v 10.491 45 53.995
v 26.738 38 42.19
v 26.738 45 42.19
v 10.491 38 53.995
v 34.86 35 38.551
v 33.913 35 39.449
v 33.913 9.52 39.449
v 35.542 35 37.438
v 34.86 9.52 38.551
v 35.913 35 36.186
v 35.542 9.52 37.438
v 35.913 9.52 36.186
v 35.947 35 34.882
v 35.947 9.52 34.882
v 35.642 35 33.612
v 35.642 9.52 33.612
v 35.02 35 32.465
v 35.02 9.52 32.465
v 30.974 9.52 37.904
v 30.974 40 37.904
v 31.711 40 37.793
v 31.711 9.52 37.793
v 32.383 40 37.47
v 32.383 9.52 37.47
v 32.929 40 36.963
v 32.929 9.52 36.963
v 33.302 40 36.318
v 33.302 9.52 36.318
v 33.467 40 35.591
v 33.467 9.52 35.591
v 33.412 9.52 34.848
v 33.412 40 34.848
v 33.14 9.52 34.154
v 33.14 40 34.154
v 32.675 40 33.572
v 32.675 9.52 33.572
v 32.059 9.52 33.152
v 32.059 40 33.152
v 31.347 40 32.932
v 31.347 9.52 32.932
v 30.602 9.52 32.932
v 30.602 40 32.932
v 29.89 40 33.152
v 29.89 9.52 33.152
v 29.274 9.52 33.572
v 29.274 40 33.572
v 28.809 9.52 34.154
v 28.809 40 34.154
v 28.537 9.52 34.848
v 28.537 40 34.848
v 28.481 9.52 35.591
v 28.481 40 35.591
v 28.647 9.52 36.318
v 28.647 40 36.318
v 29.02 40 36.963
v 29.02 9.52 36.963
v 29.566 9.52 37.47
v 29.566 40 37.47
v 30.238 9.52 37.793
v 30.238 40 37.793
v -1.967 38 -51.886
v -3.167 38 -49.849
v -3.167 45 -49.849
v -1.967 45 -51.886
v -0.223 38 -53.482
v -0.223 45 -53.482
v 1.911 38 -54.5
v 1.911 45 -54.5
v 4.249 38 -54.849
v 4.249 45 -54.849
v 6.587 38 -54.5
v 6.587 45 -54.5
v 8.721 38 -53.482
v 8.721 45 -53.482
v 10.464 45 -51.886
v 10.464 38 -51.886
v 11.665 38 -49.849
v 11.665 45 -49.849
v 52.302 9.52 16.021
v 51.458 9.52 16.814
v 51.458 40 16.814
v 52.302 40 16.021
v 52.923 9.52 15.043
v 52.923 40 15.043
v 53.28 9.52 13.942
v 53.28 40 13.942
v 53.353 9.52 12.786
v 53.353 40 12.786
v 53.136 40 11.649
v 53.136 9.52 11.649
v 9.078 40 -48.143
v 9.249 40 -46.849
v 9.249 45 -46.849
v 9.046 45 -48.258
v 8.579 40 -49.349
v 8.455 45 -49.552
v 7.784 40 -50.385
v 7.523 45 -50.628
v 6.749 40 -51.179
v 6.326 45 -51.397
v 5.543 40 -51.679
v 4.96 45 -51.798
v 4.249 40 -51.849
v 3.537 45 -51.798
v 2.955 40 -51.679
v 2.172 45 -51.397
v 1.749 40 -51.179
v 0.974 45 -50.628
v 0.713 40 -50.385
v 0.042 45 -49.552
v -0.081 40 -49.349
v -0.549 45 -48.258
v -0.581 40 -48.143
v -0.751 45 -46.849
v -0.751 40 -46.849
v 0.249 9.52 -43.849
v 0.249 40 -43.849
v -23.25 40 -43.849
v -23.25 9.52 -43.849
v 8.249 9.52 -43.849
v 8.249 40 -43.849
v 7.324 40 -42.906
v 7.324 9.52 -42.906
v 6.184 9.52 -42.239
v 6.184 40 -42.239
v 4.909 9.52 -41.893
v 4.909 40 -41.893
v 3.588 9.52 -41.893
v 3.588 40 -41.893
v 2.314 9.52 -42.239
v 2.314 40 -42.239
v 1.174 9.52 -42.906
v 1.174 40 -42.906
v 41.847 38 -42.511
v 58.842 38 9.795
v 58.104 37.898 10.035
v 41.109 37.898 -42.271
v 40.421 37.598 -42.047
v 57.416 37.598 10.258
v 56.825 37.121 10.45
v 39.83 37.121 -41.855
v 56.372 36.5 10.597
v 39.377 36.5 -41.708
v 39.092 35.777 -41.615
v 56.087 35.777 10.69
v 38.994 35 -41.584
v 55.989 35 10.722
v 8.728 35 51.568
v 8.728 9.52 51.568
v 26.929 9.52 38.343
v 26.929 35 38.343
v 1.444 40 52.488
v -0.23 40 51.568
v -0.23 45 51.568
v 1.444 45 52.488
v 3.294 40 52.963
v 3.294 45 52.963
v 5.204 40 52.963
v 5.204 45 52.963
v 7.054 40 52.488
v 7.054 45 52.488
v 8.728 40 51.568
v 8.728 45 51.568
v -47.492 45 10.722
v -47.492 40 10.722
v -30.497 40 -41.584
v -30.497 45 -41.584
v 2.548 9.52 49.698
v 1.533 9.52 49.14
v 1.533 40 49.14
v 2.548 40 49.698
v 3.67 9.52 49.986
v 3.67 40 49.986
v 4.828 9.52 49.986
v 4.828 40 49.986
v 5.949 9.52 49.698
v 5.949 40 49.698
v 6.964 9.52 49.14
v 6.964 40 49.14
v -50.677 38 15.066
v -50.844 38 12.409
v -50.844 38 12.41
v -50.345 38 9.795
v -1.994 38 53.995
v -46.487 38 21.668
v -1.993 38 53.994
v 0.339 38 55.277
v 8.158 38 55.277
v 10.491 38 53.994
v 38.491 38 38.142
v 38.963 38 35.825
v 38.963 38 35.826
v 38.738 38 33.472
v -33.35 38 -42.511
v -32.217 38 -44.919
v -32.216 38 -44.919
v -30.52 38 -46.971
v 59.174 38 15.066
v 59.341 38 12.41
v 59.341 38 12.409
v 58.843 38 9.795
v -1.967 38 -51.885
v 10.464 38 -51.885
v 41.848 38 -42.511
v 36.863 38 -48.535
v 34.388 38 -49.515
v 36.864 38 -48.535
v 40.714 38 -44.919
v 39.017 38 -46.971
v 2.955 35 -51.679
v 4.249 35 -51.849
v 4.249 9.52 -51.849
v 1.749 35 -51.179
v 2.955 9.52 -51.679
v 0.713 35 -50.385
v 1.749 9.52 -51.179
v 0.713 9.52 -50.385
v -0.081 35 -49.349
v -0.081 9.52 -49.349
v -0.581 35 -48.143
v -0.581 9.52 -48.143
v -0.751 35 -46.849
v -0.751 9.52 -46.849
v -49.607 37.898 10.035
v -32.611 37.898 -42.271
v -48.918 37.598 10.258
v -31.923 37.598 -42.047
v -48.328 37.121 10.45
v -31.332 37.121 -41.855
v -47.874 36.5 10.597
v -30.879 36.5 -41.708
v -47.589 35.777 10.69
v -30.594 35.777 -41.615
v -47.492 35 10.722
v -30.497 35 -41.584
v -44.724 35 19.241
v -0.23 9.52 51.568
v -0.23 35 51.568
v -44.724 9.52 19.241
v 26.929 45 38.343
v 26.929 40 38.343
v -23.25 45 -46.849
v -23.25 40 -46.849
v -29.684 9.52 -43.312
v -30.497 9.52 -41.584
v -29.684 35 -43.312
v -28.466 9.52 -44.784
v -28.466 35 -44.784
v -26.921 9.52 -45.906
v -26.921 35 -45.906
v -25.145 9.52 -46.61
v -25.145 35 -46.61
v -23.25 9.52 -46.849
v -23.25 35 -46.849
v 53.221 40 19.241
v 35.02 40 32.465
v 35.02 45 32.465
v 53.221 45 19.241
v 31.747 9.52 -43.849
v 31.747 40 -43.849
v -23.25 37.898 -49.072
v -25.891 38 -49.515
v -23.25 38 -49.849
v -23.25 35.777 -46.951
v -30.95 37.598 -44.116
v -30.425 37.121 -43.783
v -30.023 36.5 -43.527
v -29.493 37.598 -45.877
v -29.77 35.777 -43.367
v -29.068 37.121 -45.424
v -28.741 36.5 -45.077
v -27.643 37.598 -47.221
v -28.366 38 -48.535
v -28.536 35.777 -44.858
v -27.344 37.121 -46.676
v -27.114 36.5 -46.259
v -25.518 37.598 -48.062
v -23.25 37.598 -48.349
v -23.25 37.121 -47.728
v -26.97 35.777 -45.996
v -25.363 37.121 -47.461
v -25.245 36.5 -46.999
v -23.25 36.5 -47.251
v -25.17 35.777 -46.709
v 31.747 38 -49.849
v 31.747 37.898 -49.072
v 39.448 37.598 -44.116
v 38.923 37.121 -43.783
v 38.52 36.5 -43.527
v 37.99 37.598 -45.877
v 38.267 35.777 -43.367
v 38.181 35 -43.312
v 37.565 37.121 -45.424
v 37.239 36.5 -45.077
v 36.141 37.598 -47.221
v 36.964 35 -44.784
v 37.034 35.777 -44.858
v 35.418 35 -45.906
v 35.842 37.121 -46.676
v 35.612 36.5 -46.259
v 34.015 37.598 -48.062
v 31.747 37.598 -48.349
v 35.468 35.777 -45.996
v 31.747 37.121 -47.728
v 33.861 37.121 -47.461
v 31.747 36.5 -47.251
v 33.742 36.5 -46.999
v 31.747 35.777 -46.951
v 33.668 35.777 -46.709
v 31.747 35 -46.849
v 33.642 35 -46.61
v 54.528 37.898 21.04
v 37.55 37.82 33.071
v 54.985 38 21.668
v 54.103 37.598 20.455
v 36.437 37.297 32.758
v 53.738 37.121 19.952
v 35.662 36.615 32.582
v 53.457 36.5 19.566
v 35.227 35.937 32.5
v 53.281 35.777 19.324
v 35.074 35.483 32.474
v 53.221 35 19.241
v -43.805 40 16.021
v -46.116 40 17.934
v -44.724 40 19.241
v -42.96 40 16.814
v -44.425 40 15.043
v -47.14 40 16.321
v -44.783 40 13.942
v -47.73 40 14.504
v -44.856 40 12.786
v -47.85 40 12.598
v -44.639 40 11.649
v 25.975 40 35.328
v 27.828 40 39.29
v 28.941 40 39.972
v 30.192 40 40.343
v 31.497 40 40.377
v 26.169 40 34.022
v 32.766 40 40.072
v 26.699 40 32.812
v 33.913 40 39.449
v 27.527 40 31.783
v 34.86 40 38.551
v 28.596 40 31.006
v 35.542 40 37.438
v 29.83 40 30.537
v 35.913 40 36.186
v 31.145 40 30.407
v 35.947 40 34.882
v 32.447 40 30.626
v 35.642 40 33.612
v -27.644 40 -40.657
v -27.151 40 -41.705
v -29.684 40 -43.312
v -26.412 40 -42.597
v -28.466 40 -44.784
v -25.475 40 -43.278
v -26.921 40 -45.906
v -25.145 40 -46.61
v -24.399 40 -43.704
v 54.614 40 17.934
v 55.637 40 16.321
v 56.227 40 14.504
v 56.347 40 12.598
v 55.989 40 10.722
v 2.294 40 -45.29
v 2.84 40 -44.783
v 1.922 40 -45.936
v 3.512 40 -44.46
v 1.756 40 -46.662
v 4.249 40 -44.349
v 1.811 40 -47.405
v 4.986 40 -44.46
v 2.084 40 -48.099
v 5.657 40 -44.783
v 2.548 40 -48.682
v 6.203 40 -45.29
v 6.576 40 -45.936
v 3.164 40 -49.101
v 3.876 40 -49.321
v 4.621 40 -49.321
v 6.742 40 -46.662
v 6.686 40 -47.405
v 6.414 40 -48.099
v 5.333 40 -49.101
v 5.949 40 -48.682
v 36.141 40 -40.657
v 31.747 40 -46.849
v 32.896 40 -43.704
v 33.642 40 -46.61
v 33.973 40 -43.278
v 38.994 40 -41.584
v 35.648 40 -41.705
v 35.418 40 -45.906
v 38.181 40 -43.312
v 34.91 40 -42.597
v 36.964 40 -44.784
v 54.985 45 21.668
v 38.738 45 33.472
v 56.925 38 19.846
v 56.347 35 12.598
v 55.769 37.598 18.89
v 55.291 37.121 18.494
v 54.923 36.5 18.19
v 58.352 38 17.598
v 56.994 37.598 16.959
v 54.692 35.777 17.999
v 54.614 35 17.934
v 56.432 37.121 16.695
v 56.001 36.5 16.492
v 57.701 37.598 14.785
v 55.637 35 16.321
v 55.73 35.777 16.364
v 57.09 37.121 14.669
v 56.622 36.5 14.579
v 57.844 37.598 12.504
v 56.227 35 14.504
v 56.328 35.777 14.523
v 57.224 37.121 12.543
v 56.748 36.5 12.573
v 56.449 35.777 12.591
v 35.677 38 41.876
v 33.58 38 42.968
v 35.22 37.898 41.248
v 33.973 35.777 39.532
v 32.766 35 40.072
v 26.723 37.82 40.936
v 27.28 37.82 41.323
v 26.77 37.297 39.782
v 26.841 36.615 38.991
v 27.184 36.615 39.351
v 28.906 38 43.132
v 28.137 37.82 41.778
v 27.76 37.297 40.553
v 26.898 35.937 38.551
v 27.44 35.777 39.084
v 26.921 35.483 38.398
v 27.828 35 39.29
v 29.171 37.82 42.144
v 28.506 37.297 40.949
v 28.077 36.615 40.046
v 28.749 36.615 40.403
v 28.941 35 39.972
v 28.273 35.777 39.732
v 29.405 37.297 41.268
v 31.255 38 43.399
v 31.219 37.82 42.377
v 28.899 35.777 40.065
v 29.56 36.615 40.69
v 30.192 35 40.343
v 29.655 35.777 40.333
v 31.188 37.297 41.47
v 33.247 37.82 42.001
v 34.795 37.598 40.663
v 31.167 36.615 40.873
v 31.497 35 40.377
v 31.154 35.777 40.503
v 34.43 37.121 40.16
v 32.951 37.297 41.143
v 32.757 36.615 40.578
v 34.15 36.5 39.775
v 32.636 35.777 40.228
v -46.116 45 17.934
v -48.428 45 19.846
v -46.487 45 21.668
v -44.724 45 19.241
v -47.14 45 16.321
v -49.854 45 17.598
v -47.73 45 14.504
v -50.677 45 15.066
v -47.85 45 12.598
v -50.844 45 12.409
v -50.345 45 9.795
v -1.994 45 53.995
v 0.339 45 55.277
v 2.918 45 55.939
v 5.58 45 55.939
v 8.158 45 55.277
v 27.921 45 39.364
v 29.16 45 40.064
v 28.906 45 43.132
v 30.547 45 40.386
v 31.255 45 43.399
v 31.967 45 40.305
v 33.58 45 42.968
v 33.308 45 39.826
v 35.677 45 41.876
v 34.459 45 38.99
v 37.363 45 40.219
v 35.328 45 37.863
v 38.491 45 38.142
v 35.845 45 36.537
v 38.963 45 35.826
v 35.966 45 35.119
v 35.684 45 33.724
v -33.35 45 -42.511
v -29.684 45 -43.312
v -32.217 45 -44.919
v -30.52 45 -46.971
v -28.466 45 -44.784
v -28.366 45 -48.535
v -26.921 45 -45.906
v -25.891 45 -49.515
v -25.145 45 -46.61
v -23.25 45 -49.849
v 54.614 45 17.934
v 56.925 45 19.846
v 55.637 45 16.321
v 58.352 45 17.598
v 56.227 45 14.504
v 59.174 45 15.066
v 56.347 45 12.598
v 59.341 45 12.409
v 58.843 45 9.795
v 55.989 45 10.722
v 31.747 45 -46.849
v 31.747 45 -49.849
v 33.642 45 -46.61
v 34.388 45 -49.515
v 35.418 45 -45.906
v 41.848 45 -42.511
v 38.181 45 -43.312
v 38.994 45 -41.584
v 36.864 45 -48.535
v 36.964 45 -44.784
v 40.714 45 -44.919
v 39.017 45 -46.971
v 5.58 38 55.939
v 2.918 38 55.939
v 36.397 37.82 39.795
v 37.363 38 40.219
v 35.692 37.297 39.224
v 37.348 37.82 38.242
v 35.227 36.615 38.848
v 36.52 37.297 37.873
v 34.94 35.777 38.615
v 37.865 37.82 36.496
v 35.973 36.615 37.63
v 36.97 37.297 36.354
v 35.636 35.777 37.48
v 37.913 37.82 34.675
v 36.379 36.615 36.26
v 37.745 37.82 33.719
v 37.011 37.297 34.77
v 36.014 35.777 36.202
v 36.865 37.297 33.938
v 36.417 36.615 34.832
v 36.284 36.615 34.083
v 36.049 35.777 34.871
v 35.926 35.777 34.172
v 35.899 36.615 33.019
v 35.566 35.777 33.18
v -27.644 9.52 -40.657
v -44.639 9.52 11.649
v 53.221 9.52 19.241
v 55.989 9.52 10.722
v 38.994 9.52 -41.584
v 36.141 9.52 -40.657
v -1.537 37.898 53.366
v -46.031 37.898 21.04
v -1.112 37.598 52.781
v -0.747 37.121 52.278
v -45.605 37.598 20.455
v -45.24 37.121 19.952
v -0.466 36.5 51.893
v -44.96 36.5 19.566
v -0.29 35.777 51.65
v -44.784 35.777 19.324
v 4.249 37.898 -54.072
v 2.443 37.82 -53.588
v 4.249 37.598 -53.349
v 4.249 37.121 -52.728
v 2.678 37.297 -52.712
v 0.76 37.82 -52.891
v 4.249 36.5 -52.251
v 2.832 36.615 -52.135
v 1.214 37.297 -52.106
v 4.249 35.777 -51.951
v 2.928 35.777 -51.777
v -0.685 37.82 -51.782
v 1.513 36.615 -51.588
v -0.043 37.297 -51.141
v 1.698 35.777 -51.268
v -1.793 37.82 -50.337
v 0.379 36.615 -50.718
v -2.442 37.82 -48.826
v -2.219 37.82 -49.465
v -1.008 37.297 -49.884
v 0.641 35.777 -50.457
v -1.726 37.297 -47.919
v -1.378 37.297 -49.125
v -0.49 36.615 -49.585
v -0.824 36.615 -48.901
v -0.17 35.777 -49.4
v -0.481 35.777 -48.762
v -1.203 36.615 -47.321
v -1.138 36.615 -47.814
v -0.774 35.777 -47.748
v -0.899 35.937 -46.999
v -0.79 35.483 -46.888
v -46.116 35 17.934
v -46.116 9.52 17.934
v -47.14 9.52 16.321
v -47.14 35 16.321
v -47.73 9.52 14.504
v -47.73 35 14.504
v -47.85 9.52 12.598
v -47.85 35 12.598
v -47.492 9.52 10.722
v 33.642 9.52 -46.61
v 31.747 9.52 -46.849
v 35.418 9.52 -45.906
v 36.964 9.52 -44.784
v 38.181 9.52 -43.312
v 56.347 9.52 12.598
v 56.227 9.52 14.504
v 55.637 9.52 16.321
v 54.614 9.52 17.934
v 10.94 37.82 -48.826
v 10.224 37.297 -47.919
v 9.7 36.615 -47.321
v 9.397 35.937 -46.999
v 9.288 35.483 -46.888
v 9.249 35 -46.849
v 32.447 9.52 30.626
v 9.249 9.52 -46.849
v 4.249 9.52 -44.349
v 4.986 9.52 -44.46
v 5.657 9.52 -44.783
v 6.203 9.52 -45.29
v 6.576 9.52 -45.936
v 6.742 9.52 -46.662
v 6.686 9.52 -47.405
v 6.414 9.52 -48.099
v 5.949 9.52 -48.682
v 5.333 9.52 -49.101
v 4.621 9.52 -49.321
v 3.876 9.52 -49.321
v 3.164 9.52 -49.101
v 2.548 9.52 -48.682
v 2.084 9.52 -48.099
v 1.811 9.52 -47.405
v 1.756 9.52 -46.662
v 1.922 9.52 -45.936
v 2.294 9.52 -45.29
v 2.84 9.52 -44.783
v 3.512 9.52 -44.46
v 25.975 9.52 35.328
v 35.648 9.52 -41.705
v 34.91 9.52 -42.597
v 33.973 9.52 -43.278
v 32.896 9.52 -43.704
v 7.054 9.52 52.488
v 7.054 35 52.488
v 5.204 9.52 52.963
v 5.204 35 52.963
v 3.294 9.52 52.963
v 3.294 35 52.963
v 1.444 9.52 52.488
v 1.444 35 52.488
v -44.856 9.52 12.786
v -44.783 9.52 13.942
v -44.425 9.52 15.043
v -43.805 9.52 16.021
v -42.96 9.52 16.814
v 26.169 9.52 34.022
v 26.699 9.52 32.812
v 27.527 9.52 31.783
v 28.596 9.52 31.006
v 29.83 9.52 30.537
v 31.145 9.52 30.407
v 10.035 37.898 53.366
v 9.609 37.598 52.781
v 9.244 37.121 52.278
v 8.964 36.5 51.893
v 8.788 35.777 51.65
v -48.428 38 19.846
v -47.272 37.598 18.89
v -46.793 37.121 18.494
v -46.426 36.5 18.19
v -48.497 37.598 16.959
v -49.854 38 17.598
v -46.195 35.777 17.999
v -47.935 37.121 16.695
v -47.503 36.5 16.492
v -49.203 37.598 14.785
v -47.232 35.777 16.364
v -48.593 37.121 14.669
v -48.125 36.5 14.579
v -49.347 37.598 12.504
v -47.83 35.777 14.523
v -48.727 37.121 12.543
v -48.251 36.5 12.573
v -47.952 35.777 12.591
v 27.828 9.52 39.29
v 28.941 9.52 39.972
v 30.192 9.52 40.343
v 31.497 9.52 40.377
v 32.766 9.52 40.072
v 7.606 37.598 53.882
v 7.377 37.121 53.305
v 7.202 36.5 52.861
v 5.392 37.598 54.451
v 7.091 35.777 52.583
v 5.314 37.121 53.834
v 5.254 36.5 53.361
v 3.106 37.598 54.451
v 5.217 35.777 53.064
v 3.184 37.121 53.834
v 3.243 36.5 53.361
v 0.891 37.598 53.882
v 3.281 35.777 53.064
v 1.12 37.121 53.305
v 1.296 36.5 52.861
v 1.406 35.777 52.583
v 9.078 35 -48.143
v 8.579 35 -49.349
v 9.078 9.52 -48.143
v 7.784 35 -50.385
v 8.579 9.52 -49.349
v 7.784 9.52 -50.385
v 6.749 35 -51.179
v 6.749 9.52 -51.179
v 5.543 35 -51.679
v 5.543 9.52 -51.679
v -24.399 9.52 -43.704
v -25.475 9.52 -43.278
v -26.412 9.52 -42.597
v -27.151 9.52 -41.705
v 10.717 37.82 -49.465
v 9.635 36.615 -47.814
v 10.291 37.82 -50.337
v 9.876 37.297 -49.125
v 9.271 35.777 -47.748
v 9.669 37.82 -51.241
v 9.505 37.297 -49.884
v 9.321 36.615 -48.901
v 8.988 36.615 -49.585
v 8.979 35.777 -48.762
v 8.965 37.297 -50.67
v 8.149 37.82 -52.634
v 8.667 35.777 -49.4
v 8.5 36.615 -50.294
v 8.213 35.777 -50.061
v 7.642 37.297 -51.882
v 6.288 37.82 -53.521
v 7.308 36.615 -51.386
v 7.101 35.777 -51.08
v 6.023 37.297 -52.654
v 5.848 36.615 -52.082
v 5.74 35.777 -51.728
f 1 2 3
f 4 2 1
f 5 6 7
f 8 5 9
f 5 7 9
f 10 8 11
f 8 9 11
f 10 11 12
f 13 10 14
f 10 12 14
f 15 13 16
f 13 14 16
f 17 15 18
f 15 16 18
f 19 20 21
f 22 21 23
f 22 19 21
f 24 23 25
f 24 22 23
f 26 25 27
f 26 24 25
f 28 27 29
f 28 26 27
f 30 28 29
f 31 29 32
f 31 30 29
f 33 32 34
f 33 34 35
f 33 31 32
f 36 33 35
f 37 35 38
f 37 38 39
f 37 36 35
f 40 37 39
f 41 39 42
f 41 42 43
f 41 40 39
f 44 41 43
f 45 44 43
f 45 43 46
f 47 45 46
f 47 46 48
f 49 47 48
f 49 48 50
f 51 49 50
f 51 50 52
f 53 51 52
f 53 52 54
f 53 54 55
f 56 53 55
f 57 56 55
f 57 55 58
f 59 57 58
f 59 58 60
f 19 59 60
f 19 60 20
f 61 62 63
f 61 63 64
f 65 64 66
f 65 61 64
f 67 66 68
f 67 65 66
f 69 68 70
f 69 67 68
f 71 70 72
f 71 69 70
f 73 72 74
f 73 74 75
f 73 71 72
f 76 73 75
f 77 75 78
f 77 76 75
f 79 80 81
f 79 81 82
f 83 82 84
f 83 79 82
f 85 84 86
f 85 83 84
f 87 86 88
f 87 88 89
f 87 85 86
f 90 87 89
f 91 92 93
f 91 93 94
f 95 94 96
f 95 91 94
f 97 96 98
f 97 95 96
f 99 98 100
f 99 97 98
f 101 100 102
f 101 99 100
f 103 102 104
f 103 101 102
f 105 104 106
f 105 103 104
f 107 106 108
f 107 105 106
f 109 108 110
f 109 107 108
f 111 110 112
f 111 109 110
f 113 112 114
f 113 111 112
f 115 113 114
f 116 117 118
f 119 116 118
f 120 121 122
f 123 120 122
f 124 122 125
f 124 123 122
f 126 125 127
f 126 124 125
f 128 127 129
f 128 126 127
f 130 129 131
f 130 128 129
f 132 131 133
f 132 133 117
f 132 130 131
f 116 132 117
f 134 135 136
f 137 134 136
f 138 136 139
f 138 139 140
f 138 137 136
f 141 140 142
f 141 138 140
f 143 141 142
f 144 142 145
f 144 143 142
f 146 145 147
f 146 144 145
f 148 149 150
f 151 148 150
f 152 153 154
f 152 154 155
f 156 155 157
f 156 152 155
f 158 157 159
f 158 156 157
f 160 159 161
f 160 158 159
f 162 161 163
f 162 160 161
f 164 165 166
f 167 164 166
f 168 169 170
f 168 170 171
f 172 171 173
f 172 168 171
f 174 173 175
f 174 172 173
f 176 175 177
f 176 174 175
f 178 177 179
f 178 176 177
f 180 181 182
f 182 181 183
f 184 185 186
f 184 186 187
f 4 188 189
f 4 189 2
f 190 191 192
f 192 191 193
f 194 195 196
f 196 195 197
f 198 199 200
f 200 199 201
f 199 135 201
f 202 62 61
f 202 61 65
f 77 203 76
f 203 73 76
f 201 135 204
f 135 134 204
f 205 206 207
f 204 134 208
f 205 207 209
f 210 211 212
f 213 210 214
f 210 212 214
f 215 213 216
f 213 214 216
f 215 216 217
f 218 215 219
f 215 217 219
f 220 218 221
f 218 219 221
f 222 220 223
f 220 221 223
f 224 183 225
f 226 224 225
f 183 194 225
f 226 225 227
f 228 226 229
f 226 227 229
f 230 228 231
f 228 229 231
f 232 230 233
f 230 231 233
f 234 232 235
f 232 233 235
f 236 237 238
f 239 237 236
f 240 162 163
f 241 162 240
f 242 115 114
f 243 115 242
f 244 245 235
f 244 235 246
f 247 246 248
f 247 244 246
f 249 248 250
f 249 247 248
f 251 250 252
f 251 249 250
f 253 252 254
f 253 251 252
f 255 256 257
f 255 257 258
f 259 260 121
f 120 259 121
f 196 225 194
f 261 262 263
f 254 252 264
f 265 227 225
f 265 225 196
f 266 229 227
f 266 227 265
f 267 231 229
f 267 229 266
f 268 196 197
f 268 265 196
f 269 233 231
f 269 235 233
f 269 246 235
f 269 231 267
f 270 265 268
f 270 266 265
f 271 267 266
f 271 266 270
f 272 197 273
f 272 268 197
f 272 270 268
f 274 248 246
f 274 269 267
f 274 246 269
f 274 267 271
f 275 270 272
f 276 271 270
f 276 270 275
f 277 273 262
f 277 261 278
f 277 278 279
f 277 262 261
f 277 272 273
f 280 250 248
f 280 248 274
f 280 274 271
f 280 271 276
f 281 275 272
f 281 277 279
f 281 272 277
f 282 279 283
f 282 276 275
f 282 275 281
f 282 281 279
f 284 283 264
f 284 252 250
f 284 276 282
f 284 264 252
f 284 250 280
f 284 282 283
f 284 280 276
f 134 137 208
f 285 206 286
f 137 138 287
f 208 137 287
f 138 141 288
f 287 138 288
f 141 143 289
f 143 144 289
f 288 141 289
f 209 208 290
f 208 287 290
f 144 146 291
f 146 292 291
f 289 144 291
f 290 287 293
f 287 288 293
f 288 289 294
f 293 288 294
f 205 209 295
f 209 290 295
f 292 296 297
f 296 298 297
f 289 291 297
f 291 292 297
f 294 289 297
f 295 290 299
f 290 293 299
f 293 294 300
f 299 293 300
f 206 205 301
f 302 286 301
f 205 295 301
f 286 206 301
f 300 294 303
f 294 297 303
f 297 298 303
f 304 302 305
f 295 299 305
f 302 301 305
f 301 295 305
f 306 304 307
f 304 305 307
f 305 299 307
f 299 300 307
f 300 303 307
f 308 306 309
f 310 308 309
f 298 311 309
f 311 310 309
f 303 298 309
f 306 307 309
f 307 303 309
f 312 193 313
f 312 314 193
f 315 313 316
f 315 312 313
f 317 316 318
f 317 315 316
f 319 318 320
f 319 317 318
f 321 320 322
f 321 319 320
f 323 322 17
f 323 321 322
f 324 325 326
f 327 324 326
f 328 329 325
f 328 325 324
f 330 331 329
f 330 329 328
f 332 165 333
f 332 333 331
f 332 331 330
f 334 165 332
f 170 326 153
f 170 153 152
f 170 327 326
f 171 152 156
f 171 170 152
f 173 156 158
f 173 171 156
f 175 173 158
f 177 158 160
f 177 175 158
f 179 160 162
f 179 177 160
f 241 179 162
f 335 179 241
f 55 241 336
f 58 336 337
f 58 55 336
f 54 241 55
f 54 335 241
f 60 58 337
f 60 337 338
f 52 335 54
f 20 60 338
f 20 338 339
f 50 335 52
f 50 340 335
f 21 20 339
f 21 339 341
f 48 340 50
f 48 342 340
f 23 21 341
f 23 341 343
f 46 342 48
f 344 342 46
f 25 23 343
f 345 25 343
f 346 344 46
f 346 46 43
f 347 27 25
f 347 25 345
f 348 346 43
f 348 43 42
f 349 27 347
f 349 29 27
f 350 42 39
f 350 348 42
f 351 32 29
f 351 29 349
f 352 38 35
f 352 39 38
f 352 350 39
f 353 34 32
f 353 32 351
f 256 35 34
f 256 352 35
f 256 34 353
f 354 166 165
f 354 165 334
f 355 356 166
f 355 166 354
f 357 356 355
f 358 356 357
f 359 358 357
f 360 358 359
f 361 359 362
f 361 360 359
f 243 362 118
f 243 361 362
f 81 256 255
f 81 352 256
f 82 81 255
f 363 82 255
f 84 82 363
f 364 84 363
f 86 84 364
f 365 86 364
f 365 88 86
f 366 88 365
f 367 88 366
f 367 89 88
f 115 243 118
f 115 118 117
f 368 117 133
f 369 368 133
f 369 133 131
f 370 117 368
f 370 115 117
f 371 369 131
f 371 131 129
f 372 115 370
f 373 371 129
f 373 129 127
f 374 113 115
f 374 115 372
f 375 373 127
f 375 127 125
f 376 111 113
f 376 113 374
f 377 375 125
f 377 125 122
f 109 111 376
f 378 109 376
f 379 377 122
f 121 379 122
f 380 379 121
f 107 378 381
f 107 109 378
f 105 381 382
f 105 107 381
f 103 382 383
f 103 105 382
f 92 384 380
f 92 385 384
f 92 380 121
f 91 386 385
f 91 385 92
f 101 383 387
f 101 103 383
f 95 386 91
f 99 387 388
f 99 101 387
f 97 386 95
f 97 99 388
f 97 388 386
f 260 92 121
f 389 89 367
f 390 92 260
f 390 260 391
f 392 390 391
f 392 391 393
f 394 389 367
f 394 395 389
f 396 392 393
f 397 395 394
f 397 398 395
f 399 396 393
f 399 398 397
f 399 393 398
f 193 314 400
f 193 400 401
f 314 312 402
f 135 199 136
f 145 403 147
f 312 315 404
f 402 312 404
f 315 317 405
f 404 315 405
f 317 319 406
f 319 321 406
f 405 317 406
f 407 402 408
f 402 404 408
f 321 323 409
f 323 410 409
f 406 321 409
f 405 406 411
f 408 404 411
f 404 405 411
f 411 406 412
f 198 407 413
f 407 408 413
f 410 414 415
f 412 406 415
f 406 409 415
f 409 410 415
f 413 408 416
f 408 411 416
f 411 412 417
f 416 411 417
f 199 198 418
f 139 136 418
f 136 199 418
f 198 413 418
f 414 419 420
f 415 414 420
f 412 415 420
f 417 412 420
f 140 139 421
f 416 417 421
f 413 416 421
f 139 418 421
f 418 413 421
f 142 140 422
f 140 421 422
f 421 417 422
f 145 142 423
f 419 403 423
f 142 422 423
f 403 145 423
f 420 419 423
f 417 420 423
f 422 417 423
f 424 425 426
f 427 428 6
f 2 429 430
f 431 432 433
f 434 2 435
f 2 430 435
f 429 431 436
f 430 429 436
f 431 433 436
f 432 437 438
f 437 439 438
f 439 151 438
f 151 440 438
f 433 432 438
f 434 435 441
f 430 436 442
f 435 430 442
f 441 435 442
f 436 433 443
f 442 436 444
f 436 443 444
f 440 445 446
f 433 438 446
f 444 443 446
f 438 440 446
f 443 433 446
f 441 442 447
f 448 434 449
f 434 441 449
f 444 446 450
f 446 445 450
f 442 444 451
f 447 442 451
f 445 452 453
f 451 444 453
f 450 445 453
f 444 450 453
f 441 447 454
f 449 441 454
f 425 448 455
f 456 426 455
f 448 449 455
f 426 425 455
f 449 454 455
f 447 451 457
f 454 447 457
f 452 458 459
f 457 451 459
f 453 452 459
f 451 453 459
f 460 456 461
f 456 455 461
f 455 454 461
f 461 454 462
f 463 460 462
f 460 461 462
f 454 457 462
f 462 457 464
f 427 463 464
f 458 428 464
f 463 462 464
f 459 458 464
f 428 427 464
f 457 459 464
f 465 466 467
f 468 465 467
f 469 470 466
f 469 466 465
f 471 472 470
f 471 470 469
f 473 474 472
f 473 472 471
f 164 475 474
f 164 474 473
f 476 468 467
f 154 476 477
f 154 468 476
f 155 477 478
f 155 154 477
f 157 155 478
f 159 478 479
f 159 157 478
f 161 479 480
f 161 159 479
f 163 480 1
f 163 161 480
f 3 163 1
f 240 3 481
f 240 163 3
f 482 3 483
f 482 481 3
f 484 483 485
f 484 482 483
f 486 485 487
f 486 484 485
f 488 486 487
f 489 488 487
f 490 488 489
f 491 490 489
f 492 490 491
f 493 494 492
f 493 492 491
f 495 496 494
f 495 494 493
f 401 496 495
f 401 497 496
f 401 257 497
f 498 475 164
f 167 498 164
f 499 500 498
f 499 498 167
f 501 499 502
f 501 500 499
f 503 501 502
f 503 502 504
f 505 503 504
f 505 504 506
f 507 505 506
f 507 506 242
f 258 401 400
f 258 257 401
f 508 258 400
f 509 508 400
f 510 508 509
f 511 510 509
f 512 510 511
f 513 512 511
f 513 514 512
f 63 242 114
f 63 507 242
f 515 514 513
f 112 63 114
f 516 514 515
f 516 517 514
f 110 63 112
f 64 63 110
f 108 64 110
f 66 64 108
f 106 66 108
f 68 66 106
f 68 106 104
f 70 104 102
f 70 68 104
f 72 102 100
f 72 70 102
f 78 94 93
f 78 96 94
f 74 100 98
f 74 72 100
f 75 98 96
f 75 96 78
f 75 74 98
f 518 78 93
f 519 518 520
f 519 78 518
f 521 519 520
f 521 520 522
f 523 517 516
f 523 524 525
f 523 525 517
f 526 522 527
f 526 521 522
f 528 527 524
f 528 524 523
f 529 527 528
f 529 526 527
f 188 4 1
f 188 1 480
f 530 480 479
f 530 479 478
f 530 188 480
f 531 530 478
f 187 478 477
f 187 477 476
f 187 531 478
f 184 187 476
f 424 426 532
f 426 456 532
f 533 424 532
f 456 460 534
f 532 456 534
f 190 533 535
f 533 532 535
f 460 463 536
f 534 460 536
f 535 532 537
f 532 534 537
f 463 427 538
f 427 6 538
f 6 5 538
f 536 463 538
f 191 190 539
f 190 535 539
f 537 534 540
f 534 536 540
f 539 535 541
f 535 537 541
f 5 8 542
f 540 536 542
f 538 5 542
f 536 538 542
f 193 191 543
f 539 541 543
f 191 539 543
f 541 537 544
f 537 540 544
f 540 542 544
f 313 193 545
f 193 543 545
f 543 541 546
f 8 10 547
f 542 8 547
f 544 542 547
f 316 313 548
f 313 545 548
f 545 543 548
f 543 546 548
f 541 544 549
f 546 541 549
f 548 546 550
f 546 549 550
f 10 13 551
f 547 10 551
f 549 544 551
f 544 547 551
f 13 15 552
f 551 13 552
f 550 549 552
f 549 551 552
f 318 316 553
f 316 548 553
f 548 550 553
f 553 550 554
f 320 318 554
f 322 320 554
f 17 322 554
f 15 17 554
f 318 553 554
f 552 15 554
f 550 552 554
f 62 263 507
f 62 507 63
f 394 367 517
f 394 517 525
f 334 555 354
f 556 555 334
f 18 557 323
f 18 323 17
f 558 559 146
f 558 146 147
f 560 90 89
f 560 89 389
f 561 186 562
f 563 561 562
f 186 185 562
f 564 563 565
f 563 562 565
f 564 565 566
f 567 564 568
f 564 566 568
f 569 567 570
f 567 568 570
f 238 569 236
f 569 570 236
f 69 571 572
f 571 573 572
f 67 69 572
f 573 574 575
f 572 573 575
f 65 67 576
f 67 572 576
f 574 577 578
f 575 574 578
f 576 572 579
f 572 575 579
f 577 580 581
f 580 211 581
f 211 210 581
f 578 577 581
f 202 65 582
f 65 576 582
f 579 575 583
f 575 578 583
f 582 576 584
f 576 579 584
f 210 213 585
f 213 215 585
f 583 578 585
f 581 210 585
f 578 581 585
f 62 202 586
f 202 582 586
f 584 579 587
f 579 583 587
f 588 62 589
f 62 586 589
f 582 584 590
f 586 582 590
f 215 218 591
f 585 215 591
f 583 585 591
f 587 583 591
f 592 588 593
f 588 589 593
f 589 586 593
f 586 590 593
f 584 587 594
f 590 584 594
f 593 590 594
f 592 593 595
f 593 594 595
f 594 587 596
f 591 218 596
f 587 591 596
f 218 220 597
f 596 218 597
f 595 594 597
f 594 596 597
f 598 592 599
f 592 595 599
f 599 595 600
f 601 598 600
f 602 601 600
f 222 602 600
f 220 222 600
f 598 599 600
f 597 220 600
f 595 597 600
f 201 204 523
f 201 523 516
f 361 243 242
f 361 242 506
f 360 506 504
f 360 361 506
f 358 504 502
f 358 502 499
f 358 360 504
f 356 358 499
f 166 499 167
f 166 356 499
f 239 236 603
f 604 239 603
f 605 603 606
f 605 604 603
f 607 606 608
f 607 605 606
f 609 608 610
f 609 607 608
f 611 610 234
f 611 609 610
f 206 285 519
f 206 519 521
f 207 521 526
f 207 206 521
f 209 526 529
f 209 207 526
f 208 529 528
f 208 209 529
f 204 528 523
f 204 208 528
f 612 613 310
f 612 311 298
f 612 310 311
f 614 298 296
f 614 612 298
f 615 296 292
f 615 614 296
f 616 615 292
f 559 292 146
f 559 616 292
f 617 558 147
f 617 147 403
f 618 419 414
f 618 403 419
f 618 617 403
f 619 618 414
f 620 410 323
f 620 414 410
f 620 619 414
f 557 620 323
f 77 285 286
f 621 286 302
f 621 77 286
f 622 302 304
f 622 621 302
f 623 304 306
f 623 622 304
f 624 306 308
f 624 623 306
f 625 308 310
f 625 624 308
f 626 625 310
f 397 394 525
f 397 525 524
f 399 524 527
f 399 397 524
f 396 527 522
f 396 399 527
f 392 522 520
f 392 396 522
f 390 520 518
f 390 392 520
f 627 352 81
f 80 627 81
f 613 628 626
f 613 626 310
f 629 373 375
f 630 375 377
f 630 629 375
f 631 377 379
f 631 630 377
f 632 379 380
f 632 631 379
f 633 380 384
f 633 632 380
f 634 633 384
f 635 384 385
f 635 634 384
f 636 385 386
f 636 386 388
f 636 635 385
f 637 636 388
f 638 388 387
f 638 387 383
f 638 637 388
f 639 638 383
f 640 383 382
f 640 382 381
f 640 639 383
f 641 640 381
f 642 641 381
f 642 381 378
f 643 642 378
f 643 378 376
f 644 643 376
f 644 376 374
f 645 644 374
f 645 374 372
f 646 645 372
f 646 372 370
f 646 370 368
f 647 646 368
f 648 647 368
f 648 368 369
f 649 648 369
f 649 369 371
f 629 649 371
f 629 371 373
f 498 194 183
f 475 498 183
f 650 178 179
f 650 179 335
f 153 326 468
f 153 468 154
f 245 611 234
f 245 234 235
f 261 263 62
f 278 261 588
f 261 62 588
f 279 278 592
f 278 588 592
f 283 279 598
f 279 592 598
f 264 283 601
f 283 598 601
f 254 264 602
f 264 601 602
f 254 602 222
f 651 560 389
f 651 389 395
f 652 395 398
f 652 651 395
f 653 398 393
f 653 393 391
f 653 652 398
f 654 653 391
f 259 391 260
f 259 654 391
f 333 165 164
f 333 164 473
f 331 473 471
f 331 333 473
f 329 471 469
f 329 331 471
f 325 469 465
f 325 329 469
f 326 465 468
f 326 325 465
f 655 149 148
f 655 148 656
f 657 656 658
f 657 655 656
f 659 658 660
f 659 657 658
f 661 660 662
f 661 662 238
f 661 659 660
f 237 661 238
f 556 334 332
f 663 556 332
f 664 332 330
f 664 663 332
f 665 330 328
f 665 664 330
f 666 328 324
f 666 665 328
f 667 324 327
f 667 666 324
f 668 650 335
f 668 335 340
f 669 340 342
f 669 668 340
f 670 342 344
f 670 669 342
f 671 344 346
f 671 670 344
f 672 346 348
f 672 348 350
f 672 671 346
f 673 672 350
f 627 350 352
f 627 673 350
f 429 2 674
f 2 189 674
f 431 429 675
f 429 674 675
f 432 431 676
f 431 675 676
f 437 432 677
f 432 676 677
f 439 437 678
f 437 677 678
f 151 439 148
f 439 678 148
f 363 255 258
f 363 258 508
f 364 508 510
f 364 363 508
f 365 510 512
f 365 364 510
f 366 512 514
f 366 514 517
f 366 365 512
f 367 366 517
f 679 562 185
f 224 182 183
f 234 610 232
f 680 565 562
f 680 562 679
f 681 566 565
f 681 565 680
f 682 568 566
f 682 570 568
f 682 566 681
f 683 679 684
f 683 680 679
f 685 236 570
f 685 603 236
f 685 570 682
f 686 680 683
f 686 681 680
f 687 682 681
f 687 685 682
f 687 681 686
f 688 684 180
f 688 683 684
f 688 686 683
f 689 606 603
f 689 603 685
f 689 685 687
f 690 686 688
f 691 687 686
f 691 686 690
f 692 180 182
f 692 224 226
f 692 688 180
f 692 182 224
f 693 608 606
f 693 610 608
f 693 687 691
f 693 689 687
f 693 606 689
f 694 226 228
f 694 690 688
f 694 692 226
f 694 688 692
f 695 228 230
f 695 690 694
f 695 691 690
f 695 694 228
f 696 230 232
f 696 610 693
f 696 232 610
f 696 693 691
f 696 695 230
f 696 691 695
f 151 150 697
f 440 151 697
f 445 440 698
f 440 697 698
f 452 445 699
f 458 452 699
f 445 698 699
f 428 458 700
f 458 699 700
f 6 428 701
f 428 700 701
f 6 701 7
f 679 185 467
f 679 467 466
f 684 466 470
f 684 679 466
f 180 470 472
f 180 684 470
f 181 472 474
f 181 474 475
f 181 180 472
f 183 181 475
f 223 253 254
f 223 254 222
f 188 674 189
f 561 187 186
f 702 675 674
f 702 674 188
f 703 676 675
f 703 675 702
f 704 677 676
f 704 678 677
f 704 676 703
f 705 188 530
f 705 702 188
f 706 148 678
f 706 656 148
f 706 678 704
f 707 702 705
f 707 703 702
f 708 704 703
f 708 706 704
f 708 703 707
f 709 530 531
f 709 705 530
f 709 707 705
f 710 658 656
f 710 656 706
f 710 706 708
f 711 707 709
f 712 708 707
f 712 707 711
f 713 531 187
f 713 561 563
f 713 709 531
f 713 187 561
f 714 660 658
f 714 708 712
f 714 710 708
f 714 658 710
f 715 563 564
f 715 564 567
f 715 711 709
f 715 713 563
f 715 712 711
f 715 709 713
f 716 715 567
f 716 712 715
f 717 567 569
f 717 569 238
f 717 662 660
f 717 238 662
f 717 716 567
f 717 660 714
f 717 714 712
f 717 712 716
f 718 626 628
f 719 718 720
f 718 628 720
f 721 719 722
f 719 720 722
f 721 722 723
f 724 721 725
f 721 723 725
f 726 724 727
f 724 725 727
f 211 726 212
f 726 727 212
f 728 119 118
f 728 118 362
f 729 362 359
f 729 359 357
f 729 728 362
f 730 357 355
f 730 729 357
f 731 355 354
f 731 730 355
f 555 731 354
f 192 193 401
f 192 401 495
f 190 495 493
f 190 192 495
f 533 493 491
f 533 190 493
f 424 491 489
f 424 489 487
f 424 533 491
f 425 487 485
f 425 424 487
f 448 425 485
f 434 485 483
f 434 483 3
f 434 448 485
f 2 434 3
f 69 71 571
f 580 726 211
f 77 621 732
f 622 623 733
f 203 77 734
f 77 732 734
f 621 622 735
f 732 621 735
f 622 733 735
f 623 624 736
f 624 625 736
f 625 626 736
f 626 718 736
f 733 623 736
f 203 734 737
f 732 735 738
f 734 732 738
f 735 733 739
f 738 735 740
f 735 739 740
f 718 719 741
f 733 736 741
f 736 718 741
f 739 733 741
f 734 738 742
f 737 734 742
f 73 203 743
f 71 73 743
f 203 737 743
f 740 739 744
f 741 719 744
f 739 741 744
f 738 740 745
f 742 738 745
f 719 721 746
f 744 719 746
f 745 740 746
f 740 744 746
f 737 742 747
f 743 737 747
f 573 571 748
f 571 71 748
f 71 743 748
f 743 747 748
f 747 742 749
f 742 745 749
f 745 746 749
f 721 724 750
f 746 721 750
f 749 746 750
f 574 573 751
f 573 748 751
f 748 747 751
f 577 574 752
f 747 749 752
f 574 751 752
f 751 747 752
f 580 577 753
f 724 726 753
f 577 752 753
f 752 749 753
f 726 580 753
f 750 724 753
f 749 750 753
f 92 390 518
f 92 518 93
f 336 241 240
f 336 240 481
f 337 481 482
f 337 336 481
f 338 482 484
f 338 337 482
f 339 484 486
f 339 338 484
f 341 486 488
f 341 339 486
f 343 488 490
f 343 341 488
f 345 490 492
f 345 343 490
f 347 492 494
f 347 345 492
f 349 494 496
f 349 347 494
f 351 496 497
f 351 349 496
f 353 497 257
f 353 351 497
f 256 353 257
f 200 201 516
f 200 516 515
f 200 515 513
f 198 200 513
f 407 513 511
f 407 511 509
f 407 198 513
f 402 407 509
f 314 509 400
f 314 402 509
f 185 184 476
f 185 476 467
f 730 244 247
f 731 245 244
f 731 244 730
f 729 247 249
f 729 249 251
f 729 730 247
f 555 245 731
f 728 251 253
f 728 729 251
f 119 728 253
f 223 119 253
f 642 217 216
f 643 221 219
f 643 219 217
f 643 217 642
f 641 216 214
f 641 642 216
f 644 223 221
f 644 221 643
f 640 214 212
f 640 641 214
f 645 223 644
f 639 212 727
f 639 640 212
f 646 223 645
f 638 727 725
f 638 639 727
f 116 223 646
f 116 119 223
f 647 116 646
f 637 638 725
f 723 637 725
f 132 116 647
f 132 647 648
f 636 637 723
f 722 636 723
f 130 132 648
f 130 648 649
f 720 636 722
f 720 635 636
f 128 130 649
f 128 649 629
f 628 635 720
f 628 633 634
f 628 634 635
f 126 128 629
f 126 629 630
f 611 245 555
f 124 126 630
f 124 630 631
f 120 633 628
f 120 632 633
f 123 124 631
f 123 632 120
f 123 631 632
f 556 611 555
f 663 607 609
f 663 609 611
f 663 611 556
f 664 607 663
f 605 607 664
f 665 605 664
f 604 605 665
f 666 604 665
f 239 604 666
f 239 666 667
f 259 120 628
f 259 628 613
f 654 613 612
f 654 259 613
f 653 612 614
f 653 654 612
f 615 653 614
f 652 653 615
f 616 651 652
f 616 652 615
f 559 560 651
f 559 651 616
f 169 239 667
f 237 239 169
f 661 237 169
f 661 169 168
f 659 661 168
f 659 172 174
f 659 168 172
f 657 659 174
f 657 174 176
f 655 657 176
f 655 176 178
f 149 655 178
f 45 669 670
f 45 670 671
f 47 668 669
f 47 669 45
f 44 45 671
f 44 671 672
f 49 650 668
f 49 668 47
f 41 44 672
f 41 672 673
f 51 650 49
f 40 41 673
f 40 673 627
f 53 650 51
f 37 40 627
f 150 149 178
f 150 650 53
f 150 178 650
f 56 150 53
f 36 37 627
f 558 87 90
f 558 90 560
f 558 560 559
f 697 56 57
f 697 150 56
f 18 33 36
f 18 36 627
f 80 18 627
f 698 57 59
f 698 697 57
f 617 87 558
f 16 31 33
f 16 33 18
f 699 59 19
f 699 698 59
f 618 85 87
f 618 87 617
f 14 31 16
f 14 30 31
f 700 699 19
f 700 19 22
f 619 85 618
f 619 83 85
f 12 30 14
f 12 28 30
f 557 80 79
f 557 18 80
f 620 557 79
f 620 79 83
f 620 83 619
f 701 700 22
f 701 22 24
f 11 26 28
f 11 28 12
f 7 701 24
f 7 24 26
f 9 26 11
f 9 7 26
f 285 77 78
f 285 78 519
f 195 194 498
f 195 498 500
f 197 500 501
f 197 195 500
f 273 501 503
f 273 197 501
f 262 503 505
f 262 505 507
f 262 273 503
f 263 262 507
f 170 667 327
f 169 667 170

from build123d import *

# Parameters (mm, degrees)
SKETCH1_R                = 2.5
BOSS_EXTRUDE1_DEPTH      = 40
BOSS_EXTRUDE2_DEPTH      = 5
BOSS_EXTRUDE2_DEPTH_BACK = 2
FILLET1_R                = 3
BOSS_EXTRUDE3_START      = 7
SKETCH3_R                = 2.5
BOSS_EXTRUDE3_DEPTH      = 7
SKETCH4_R                = 2.5
CUT_EXTRUDE1_DEPTH       = 16.52


with BuildPart() as part:
    # Sketch1 → Boss-Extrude1 (new body)
    # profile 1 of 3: a face of its own
    with BuildSketch(Plane(origin=(0, 0, 0), x_dir=(1, 0, 0), z_dir=(0, 1, 0))):
        with BuildLine():
            Line((55.989380272, -10.721623107), (38.994348201, 41.58370731))
            ThreePointArc((38.994348201, 41.58370731), (36.22622117, 45.39370731), (31.747297547, 46.848997812))
            Line((31.747297547, 46.848997812), (9.248758018, 46.848997812))
            ThreePointArc((9.248758018, 46.848997812), (7.784291924, 50.384531718), (4.248758018, 51.848997812))
            Line((4.248758018, 51.848997812), (4.248758018, 50.848997812))
            ThreePointArc((4.248758018, 50.848997812), (1.420330893, 49.677424937), (0.248758018, 46.848997812))
            Line((0.248758018, 46.848997812), (-23.249781512, 46.848997812))
            ThreePointArc((-23.249781512, 46.848997812), (-27.728705135, 45.39370731), (-30.496832166, 41.58370731))
            Line((-30.496832166, 41.58370731), (-47.491864237, -10.721623107))
            ThreePointArc((-47.491864237, -10.721623107), (-47.491864237, -15.431042101), (-44.723737205, -19.241042101))
            Line((-44.723737205, -19.241042101), (-0.230165605, -51.567514092))
            ThreePointArc((-0.230165605, -51.567514092), (4.248758018, -53.022804594), (8.72768164, -51.567514092))
            Line((8.72768164, -51.567514092), (27.738399463, -37.755419106))
            ThreePointArc((27.738399463, -37.755419106), (30.34872958, -39.355031459), (33.325608449, -38.640346074))
            Line((33.325608449, -38.640346074), (33.913393702, -39.449363068))
            ThreePointArc((33.913393702, -39.449363068), (35.912909143, -36.186450422), (35.019552412, -32.465351835))
            Line((35.019552412, -32.465351835), (53.22125324, -19.241042101))
            ThreePointArc((53.22125324, -19.241042101), (55.989380272, -15.431042101), (55.989380272, -10.721623107))
        make_face()
        with Locations(Location((4.248758018, 46.848997812, 0), (0, 0, 270))):
            Circle(SKETCH1_R, mode=Mode.SUBTRACT)
        with Locations(Location((30.97446744, -35.404278096, 0), (0, 0, 270))):
            Circle(SKETCH1_R, mode=Mode.SUBTRACT)
        with BuildLine():
            ThreePointArc((-23.249781512, 43.848997812), (-25.965349378, 42.966656326), (-27.643662617, 40.656656326))
            Line((-27.643662617, 40.656656326), (-44.638694688, -11.64867409))
            ThreePointArc((-44.638694688, -11.64867409), (-44.638694688, -14.503991118), (-42.960381448, -16.813991118))
            Line((-42.960381448, -16.813991118), (1.533190152, -49.140463108))
            ThreePointArc((1.533190152, -49.140463108), (4.248758018, -50.022804594), (6.964325883, -49.140463108))
            Line((6.964325883, -49.140463108), (25.975043706, -35.328368122))
            ThreePointArc((25.975043706, -35.328368122), (28.035541179, -31.359193125), (32.447179661, -30.626086104))
            Line((32.447179661, -30.626086104), (51.457897483, -16.813991118))
            ThreePointArc((51.457897483, -16.813991118), (53.136210723, -14.503991118), (53.136210723, -11.64867409))
            Line((53.136210723, -11.64867409), (36.141178653, 40.656656326))
            ThreePointArc((36.141178653, 40.656656326), (34.462865413, 42.966656326), (31.747297547, 43.848997812))
            Line((31.747297547, 43.848997812), (8.248758018, 43.848997812))
            ThreePointArc((8.248758018, 43.848997812), (4.248758018, 41.848997812), (0.248758018, 43.848997812))
            Line((0.248758018, 43.848997812), (-23.249781512, 43.848997812))
        make_face(mode=Mode.SUBTRACT)
    # profile 2 of 3: a face of its own
    with BuildSketch(Plane(origin=(0, 0, 0), x_dir=(1, 0, 0), z_dir=(0, 1, 0))):
        with BuildLine():
            ThreePointArc((26.929382468, -38.343204358), (30.192295115, -40.342719799), (33.913393702, -39.449363068))
            Line((33.913393702, -39.449363068), (33.325608449, -38.640346074))
            ThreePointArc((33.325608449, -38.640346074), (30.34872958, -39.355031459), (27.738399463, -37.755419106))
            Line((27.738399463, -37.755419106), (26.929382468, -38.343204358))
        make_face()
    # profile 3 of 3: a face of its own
    with BuildSketch(Plane(origin=(0, 0, 0), x_dir=(1, 0, 0), z_dir=(0, 1, 0))):
        with BuildLine():
            Line((4.248758018, 50.848997812), (4.248758018, 51.848997812))
            ThreePointArc((4.248758018, 51.848997812), (0.713224112, 50.384531718), (-0.751241982, 46.848997812))
            Line((-0.751241982, 46.848997812), (0.248758018, 46.848997812))
            ThreePointArc((0.248758018, 46.848997812), (1.420330893, 49.677424937), (4.248758018, 50.848997812))
        make_face()
    extrude(amount=BOSS_EXTRUDE1_DEPTH)

    # Sketch2 → Boss-Extrude2 (add, two sides: drawn at the far end of the back side and taken through both)
    with BuildSketch(Plane(origin=(0, 40, 0), x_dir=(1, 0, 0), z_dir=(0, 1, 0)).offset(-BOSS_EXTRUDE2_DEPTH_BACK)):
        Polygon((-30.496832166, 41.58370731), (-33.350001715, 42.510758293), (-50.345033785, -9.794572124), (-47.491864237, -10.721623107), align=None)
        with BuildLine():
            Line((-1.993521362, -53.994565075), (-46.487092962, -21.668093084))
            ThreePointArc((-46.487092962, -21.668093084), (-50.345033785, -16.358093084), (-50.345033785, -9.794572124))
            Line((-50.345033785, -9.794572124), (-47.491864237, -10.721623107))
            ThreePointArc((-47.491864237, -10.721623107), (-47.491864237, -15.431042101), (-44.723737205, -19.241042101))
            Line((-44.723737205, -19.241042101), (-0.230165605, -51.567514092))
            ThreePointArc((-0.230165605, -51.567514092), (4.248758018, -53.022804594), (8.72768164, -51.567514092))
            Line((8.72768164, -51.567514092), (26.929382468, -38.343204358))
            ThreePointArc((26.929382468, -38.343204358), (33.913393702, -39.449363068), (35.019552412, -32.465351835))
            Line((35.019552412, -32.465351835), (53.22125324, -19.241042101))
            ThreePointArc((53.22125324, -19.241042101), (55.989380272, -15.431042101), (55.989380272, -10.721623107))
            Line((55.989380272, -10.721623107), (38.994348201, 41.58370731))
            ThreePointArc((38.994348201, 41.58370731), (36.22622117, 45.39370731), (31.747297547, 46.848997812))
            Line((31.747297547, 46.848997812), (9.248758018, 46.848997812))
            ThreePointArc((9.248758018, 46.848997812), (4.248758018, 51.848997812), (-0.751241982, 46.848997812))
            Line((-0.751241982, 46.848997812), (-23.249781512, 46.848997812))
            Line((-23.249781512, 46.848997812), (-23.249781512, 49.848997812))
            Line((-23.249781512, 49.848997812), (-3.16744047, 49.848997812))
            ThreePointArc((-3.16744047, 49.848997812), (4.248758018, 54.848997812), (11.664956505, 49.848997812))
            Line((11.664956505, 49.848997812), (31.747297547, 49.848997812))
            ThreePointArc((31.747297547, 49.848997812), (37.989576927, 47.820758293), (41.84751775, 42.510758293))
            Line((41.84751775, 42.510758293), (58.842549821, -9.794572124))
            ThreePointArc((58.842549821, -9.794572124), (58.842549821, -16.358093084), (54.984608997, -21.668093084))
            Line((54.984608997, -21.668093084), (38.737653807, -33.472196981))
            ThreePointArc((38.737653807, -33.472196981), (35.676749458, -41.876414051), (26.737992587, -42.190461178))
            Line((26.737992587, -42.190461178), (10.491037397, -53.994565075))
            ThreePointArc((10.491037397, -53.994565075), (4.248758018, -56.022804594), (-1.993521362, -53.994565075))
        make_face()
        with BuildLine():
            ThreePointArc((-33.350001715, 42.510758293), (-29.492060891, 47.820758293), (-23.249781512, 49.848997812))
            Line((-23.249781512, 49.848997812), (-23.249781512, 46.848997812))
            ThreePointArc((-23.249781512, 46.848997812), (-27.728705135, 45.39370731), (-30.496832166, 41.58370731))
            Line((-30.496832166, 41.58370731), (-33.350001715, 42.510758293))
        make_face()
    extrude(amount=BOSS_EXTRUDE2_DEPTH + BOSS_EXTRUDE2_DEPTH_BACK)

    # Fillet1
    fillet1_edges = [part.edges().sort_by_distance(p)[0] for p in [
        (-38.994348201, 38, -15.431042101),
        (-47.491864237, 38, 15.431042101),
        (-22.476951405, 38, 35.404278096),
        (4.248758018, 38, 53.022804594),
        (17.828532054, 38, 44.955359225),
        (33.913393702, 38, 39.449363068),
        (44.120402826, 38, 25.853196968),
        (55.989380272, 38, 15.431042101),
        (47.491864237, 38, -15.431042101),
        (36.22622117, 38, -45.39370731),
        (20.498027782, 38, -46.848997812),
        (4.248758018, 38, -51.848997812),
        (-12.000511747, 38, -46.848997812),
        (-27.728705135, 38, -45.39370731),
    ]]
    fillet(fillet1_edges, radius=FILLET1_R - 0.0001)  # a hair under: the kernel refuses the full size

    # Sketch3 → Boss-Extrude3 (add)
    with BuildSketch(Plane.XZ.offset(BOSS_EXTRUDE3_START)):
        with BuildLine():
            Line((38.994348201, -41.58370731), (55.989380272, 10.721623107))
            ThreePointArc((55.989380272, 10.721623107), (55.989380272, 15.431042101), (53.22125324, 19.241042101))
            Line((53.22125324, 19.241042101), (35.019552412, 32.465351835))
            ThreePointArc((35.019552412, 32.465351835), (33.913393702, 39.449363068), (26.929382468, 38.343204358))
            Line((26.929382468, 38.343204358), (8.72768164, 51.567514092))
            ThreePointArc((8.72768164, 51.567514092), (4.248758018, 53.022804594), (-0.230165605, 51.567514092))
            Line((-0.230165605, 51.567514092), (-44.723737205, 19.241042101))
            ThreePointArc((-44.723737205, 19.241042101), (-47.491864237, 15.431042101), (-47.491864237, 10.721623107))
            Line((-47.491864237, 10.721623107), (-30.496832166, -41.58370731))
            ThreePointArc((-30.496832166, -41.58370731), (-27.728705135, -45.39370731), (-23.249781512, -46.848997812))
            Line((-23.249781512, -46.848997812), (-0.751241982, -46.848997812))
            ThreePointArc((-0.751241982, -46.848997812), (4.248758018, -51.848997812), (9.248758018, -46.848997812))
            Line((9.248758018, -46.848997812), (31.747297547, -46.848997812))
            ThreePointArc((31.747297547, -46.848997812), (36.22622117, -45.39370731), (38.994348201, -41.58370731))
        make_face()
        with Locations(Location((30.97446744, 35.404278096, 0), (0, 0, 270))):
            Circle(SKETCH3_R, mode=Mode.SUBTRACT)
        with Locations(Location((4.248758018, -46.848997812, 0), (0, 0, 270))):
            Circle(SKETCH3_R, mode=Mode.SUBTRACT)
        with BuildLine():
            Line((-44.638694688, 11.64867409), (-27.643662617, -40.656656326))
            ThreePointArc((-27.643662617, -40.656656326), (-25.965349378, -42.966656326), (-23.249781512, -43.848997812))
            Line((-23.249781512, -43.848997812), (0.248758018, -43.848997812))
            ThreePointArc((0.248758018, -43.848997812), (4.248758018, -41.848997812), (8.248758018, -43.848997812))
            Line((8.248758018, -43.848997812), (31.747297547, -43.848997812))
            ThreePointArc((31.747297547, -43.848997812), (34.462865413, -42.966656326), (36.141178653, -40.656656326))
            Line((36.141178653, -40.656656326), (53.136210723, 11.64867409))
            ThreePointArc((53.136210723, 11.64867409), (53.136210723, 14.503991118), (51.457897483, 16.813991118))
            Line((51.457897483, 16.813991118), (32.447179661, 30.626086104))
            ThreePointArc((32.447179661, 30.626086104), (28.035541179, 31.359193125), (25.975043706, 35.328368122))
            Line((25.975043706, 35.328368122), (6.964325883, 49.140463108))
            ThreePointArc((6.964325883, 49.140463108), (4.248758018, 50.022804594), (1.533190152, 49.140463108))
            Line((1.533190152, 49.140463108), (-42.960381448, 16.813991118))
            ThreePointArc((-42.960381448, 16.813991118), (-44.638694688, 14.503991118), (-44.638694688, 11.64867409))
        make_face(mode=Mode.SUBTRACT)
    extrude(amount=-BOSS_EXTRUDE3_DEPTH)

    # Sketch4 → Cut-Extrude1 (cut)
    with BuildSketch(Plane.XZ.offset(7)):
        with BuildLine():
            Line((38.994348201, -41.58370731), (55.989380272, 10.721623107))
            ThreePointArc((55.989380272, 10.721623107), (55.989380272, 15.431042101), (53.22125324, 19.241042101))
            Line((53.22125324, 19.241042101), (35.019552412, 32.465351835))
            ThreePointArc((35.019552412, 32.465351835), (33.913393702, 39.449363068), (26.929382468, 38.343204358))
            Line((26.929382468, 38.343204358), (8.72768164, 51.567514092))
            ThreePointArc((8.72768164, 51.567514092), (4.248758018, 53.022804594), (-0.230165605, 51.567514092))
            Line((-0.230165605, 51.567514092), (-44.723737205, 19.241042101))
            ThreePointArc((-44.723737205, 19.241042101), (-47.491864237, 15.431042101), (-47.491864237, 10.721623107))
            Line((-47.491864237, 10.721623107), (-30.496832166, -41.58370731))
            ThreePointArc((-30.496832166, -41.58370731), (-27.728705135, -45.39370731), (-23.249781512, -46.848997812))
            Line((-23.249781512, -46.848997812), (-0.751241982, -46.848997812))
            ThreePointArc((-0.751241982, -46.848997812), (4.248758018, -51.848997812), (9.248758018, -46.848997812))
            Line((9.248758018, -46.848997812), (31.747297547, -46.848997812))
            ThreePointArc((31.747297547, -46.848997812), (36.22622117, -45.39370731), (38.994348201, -41.58370731))
        make_face()
        with Locations(Location((30.97446744, 35.404278096, 0), (0, 0, 270))):
            Circle(SKETCH4_R, mode=Mode.SUBTRACT)
        with Locations(Location((4.248758018, -46.848997812, 0), (0, 0, 270))):
            Circle(SKETCH4_R, mode=Mode.SUBTRACT)
        with BuildLine():
            Line((-23.249781512, -43.848997812), (0.248758018, -43.848997812))
            ThreePointArc((0.248758018, -43.848997812), (4.248758018, -41.848997812), (8.248758018, -43.848997812))
            Line((8.248758018, -43.848997812), (31.747297547, -43.848997812))
            ThreePointArc((31.747297547, -43.848997812), (34.462865413, -42.966656326), (36.141178653, -40.656656326))
            Line((36.141178653, -40.656656326), (53.136210723, 11.64867409))
            ThreePointArc((53.136210723, 11.64867409), (53.136210723, 14.503991118), (51.457897483, 16.813991118))
            Line((51.457897483, 16.813991118), (32.447179661, 30.626086104))
            ThreePointArc((32.447179661, 30.626086104), (28.035541179, 31.359193125), (25.975043706, 35.328368122))
            Line((25.975043706, 35.328368122), (6.964325883, 49.140463108))
            ThreePointArc((6.964325883, 49.140463108), (4.248758018, 50.022804594), (1.533190152, 49.140463108))
            Line((1.533190152, 49.140463108), (-42.960381448, 16.813991118))
            ThreePointArc((-42.960381448, 16.813991118), (-44.638694688, 14.503991118), (-44.638694688, 11.64867409))
            Line((-44.638694688, 11.64867409), (-27.643662617, -40.656656326))
            ThreePointArc((-27.643662617, -40.656656326), (-25.965349378, -42.966656326), (-23.249781512, -43.848997812))
        make_face(mode=Mode.SUBTRACT)
    extrude(amount=-CUT_EXTRUDE1_DEPTH, mode=Mode.SUBTRACT)


solid = part.part
